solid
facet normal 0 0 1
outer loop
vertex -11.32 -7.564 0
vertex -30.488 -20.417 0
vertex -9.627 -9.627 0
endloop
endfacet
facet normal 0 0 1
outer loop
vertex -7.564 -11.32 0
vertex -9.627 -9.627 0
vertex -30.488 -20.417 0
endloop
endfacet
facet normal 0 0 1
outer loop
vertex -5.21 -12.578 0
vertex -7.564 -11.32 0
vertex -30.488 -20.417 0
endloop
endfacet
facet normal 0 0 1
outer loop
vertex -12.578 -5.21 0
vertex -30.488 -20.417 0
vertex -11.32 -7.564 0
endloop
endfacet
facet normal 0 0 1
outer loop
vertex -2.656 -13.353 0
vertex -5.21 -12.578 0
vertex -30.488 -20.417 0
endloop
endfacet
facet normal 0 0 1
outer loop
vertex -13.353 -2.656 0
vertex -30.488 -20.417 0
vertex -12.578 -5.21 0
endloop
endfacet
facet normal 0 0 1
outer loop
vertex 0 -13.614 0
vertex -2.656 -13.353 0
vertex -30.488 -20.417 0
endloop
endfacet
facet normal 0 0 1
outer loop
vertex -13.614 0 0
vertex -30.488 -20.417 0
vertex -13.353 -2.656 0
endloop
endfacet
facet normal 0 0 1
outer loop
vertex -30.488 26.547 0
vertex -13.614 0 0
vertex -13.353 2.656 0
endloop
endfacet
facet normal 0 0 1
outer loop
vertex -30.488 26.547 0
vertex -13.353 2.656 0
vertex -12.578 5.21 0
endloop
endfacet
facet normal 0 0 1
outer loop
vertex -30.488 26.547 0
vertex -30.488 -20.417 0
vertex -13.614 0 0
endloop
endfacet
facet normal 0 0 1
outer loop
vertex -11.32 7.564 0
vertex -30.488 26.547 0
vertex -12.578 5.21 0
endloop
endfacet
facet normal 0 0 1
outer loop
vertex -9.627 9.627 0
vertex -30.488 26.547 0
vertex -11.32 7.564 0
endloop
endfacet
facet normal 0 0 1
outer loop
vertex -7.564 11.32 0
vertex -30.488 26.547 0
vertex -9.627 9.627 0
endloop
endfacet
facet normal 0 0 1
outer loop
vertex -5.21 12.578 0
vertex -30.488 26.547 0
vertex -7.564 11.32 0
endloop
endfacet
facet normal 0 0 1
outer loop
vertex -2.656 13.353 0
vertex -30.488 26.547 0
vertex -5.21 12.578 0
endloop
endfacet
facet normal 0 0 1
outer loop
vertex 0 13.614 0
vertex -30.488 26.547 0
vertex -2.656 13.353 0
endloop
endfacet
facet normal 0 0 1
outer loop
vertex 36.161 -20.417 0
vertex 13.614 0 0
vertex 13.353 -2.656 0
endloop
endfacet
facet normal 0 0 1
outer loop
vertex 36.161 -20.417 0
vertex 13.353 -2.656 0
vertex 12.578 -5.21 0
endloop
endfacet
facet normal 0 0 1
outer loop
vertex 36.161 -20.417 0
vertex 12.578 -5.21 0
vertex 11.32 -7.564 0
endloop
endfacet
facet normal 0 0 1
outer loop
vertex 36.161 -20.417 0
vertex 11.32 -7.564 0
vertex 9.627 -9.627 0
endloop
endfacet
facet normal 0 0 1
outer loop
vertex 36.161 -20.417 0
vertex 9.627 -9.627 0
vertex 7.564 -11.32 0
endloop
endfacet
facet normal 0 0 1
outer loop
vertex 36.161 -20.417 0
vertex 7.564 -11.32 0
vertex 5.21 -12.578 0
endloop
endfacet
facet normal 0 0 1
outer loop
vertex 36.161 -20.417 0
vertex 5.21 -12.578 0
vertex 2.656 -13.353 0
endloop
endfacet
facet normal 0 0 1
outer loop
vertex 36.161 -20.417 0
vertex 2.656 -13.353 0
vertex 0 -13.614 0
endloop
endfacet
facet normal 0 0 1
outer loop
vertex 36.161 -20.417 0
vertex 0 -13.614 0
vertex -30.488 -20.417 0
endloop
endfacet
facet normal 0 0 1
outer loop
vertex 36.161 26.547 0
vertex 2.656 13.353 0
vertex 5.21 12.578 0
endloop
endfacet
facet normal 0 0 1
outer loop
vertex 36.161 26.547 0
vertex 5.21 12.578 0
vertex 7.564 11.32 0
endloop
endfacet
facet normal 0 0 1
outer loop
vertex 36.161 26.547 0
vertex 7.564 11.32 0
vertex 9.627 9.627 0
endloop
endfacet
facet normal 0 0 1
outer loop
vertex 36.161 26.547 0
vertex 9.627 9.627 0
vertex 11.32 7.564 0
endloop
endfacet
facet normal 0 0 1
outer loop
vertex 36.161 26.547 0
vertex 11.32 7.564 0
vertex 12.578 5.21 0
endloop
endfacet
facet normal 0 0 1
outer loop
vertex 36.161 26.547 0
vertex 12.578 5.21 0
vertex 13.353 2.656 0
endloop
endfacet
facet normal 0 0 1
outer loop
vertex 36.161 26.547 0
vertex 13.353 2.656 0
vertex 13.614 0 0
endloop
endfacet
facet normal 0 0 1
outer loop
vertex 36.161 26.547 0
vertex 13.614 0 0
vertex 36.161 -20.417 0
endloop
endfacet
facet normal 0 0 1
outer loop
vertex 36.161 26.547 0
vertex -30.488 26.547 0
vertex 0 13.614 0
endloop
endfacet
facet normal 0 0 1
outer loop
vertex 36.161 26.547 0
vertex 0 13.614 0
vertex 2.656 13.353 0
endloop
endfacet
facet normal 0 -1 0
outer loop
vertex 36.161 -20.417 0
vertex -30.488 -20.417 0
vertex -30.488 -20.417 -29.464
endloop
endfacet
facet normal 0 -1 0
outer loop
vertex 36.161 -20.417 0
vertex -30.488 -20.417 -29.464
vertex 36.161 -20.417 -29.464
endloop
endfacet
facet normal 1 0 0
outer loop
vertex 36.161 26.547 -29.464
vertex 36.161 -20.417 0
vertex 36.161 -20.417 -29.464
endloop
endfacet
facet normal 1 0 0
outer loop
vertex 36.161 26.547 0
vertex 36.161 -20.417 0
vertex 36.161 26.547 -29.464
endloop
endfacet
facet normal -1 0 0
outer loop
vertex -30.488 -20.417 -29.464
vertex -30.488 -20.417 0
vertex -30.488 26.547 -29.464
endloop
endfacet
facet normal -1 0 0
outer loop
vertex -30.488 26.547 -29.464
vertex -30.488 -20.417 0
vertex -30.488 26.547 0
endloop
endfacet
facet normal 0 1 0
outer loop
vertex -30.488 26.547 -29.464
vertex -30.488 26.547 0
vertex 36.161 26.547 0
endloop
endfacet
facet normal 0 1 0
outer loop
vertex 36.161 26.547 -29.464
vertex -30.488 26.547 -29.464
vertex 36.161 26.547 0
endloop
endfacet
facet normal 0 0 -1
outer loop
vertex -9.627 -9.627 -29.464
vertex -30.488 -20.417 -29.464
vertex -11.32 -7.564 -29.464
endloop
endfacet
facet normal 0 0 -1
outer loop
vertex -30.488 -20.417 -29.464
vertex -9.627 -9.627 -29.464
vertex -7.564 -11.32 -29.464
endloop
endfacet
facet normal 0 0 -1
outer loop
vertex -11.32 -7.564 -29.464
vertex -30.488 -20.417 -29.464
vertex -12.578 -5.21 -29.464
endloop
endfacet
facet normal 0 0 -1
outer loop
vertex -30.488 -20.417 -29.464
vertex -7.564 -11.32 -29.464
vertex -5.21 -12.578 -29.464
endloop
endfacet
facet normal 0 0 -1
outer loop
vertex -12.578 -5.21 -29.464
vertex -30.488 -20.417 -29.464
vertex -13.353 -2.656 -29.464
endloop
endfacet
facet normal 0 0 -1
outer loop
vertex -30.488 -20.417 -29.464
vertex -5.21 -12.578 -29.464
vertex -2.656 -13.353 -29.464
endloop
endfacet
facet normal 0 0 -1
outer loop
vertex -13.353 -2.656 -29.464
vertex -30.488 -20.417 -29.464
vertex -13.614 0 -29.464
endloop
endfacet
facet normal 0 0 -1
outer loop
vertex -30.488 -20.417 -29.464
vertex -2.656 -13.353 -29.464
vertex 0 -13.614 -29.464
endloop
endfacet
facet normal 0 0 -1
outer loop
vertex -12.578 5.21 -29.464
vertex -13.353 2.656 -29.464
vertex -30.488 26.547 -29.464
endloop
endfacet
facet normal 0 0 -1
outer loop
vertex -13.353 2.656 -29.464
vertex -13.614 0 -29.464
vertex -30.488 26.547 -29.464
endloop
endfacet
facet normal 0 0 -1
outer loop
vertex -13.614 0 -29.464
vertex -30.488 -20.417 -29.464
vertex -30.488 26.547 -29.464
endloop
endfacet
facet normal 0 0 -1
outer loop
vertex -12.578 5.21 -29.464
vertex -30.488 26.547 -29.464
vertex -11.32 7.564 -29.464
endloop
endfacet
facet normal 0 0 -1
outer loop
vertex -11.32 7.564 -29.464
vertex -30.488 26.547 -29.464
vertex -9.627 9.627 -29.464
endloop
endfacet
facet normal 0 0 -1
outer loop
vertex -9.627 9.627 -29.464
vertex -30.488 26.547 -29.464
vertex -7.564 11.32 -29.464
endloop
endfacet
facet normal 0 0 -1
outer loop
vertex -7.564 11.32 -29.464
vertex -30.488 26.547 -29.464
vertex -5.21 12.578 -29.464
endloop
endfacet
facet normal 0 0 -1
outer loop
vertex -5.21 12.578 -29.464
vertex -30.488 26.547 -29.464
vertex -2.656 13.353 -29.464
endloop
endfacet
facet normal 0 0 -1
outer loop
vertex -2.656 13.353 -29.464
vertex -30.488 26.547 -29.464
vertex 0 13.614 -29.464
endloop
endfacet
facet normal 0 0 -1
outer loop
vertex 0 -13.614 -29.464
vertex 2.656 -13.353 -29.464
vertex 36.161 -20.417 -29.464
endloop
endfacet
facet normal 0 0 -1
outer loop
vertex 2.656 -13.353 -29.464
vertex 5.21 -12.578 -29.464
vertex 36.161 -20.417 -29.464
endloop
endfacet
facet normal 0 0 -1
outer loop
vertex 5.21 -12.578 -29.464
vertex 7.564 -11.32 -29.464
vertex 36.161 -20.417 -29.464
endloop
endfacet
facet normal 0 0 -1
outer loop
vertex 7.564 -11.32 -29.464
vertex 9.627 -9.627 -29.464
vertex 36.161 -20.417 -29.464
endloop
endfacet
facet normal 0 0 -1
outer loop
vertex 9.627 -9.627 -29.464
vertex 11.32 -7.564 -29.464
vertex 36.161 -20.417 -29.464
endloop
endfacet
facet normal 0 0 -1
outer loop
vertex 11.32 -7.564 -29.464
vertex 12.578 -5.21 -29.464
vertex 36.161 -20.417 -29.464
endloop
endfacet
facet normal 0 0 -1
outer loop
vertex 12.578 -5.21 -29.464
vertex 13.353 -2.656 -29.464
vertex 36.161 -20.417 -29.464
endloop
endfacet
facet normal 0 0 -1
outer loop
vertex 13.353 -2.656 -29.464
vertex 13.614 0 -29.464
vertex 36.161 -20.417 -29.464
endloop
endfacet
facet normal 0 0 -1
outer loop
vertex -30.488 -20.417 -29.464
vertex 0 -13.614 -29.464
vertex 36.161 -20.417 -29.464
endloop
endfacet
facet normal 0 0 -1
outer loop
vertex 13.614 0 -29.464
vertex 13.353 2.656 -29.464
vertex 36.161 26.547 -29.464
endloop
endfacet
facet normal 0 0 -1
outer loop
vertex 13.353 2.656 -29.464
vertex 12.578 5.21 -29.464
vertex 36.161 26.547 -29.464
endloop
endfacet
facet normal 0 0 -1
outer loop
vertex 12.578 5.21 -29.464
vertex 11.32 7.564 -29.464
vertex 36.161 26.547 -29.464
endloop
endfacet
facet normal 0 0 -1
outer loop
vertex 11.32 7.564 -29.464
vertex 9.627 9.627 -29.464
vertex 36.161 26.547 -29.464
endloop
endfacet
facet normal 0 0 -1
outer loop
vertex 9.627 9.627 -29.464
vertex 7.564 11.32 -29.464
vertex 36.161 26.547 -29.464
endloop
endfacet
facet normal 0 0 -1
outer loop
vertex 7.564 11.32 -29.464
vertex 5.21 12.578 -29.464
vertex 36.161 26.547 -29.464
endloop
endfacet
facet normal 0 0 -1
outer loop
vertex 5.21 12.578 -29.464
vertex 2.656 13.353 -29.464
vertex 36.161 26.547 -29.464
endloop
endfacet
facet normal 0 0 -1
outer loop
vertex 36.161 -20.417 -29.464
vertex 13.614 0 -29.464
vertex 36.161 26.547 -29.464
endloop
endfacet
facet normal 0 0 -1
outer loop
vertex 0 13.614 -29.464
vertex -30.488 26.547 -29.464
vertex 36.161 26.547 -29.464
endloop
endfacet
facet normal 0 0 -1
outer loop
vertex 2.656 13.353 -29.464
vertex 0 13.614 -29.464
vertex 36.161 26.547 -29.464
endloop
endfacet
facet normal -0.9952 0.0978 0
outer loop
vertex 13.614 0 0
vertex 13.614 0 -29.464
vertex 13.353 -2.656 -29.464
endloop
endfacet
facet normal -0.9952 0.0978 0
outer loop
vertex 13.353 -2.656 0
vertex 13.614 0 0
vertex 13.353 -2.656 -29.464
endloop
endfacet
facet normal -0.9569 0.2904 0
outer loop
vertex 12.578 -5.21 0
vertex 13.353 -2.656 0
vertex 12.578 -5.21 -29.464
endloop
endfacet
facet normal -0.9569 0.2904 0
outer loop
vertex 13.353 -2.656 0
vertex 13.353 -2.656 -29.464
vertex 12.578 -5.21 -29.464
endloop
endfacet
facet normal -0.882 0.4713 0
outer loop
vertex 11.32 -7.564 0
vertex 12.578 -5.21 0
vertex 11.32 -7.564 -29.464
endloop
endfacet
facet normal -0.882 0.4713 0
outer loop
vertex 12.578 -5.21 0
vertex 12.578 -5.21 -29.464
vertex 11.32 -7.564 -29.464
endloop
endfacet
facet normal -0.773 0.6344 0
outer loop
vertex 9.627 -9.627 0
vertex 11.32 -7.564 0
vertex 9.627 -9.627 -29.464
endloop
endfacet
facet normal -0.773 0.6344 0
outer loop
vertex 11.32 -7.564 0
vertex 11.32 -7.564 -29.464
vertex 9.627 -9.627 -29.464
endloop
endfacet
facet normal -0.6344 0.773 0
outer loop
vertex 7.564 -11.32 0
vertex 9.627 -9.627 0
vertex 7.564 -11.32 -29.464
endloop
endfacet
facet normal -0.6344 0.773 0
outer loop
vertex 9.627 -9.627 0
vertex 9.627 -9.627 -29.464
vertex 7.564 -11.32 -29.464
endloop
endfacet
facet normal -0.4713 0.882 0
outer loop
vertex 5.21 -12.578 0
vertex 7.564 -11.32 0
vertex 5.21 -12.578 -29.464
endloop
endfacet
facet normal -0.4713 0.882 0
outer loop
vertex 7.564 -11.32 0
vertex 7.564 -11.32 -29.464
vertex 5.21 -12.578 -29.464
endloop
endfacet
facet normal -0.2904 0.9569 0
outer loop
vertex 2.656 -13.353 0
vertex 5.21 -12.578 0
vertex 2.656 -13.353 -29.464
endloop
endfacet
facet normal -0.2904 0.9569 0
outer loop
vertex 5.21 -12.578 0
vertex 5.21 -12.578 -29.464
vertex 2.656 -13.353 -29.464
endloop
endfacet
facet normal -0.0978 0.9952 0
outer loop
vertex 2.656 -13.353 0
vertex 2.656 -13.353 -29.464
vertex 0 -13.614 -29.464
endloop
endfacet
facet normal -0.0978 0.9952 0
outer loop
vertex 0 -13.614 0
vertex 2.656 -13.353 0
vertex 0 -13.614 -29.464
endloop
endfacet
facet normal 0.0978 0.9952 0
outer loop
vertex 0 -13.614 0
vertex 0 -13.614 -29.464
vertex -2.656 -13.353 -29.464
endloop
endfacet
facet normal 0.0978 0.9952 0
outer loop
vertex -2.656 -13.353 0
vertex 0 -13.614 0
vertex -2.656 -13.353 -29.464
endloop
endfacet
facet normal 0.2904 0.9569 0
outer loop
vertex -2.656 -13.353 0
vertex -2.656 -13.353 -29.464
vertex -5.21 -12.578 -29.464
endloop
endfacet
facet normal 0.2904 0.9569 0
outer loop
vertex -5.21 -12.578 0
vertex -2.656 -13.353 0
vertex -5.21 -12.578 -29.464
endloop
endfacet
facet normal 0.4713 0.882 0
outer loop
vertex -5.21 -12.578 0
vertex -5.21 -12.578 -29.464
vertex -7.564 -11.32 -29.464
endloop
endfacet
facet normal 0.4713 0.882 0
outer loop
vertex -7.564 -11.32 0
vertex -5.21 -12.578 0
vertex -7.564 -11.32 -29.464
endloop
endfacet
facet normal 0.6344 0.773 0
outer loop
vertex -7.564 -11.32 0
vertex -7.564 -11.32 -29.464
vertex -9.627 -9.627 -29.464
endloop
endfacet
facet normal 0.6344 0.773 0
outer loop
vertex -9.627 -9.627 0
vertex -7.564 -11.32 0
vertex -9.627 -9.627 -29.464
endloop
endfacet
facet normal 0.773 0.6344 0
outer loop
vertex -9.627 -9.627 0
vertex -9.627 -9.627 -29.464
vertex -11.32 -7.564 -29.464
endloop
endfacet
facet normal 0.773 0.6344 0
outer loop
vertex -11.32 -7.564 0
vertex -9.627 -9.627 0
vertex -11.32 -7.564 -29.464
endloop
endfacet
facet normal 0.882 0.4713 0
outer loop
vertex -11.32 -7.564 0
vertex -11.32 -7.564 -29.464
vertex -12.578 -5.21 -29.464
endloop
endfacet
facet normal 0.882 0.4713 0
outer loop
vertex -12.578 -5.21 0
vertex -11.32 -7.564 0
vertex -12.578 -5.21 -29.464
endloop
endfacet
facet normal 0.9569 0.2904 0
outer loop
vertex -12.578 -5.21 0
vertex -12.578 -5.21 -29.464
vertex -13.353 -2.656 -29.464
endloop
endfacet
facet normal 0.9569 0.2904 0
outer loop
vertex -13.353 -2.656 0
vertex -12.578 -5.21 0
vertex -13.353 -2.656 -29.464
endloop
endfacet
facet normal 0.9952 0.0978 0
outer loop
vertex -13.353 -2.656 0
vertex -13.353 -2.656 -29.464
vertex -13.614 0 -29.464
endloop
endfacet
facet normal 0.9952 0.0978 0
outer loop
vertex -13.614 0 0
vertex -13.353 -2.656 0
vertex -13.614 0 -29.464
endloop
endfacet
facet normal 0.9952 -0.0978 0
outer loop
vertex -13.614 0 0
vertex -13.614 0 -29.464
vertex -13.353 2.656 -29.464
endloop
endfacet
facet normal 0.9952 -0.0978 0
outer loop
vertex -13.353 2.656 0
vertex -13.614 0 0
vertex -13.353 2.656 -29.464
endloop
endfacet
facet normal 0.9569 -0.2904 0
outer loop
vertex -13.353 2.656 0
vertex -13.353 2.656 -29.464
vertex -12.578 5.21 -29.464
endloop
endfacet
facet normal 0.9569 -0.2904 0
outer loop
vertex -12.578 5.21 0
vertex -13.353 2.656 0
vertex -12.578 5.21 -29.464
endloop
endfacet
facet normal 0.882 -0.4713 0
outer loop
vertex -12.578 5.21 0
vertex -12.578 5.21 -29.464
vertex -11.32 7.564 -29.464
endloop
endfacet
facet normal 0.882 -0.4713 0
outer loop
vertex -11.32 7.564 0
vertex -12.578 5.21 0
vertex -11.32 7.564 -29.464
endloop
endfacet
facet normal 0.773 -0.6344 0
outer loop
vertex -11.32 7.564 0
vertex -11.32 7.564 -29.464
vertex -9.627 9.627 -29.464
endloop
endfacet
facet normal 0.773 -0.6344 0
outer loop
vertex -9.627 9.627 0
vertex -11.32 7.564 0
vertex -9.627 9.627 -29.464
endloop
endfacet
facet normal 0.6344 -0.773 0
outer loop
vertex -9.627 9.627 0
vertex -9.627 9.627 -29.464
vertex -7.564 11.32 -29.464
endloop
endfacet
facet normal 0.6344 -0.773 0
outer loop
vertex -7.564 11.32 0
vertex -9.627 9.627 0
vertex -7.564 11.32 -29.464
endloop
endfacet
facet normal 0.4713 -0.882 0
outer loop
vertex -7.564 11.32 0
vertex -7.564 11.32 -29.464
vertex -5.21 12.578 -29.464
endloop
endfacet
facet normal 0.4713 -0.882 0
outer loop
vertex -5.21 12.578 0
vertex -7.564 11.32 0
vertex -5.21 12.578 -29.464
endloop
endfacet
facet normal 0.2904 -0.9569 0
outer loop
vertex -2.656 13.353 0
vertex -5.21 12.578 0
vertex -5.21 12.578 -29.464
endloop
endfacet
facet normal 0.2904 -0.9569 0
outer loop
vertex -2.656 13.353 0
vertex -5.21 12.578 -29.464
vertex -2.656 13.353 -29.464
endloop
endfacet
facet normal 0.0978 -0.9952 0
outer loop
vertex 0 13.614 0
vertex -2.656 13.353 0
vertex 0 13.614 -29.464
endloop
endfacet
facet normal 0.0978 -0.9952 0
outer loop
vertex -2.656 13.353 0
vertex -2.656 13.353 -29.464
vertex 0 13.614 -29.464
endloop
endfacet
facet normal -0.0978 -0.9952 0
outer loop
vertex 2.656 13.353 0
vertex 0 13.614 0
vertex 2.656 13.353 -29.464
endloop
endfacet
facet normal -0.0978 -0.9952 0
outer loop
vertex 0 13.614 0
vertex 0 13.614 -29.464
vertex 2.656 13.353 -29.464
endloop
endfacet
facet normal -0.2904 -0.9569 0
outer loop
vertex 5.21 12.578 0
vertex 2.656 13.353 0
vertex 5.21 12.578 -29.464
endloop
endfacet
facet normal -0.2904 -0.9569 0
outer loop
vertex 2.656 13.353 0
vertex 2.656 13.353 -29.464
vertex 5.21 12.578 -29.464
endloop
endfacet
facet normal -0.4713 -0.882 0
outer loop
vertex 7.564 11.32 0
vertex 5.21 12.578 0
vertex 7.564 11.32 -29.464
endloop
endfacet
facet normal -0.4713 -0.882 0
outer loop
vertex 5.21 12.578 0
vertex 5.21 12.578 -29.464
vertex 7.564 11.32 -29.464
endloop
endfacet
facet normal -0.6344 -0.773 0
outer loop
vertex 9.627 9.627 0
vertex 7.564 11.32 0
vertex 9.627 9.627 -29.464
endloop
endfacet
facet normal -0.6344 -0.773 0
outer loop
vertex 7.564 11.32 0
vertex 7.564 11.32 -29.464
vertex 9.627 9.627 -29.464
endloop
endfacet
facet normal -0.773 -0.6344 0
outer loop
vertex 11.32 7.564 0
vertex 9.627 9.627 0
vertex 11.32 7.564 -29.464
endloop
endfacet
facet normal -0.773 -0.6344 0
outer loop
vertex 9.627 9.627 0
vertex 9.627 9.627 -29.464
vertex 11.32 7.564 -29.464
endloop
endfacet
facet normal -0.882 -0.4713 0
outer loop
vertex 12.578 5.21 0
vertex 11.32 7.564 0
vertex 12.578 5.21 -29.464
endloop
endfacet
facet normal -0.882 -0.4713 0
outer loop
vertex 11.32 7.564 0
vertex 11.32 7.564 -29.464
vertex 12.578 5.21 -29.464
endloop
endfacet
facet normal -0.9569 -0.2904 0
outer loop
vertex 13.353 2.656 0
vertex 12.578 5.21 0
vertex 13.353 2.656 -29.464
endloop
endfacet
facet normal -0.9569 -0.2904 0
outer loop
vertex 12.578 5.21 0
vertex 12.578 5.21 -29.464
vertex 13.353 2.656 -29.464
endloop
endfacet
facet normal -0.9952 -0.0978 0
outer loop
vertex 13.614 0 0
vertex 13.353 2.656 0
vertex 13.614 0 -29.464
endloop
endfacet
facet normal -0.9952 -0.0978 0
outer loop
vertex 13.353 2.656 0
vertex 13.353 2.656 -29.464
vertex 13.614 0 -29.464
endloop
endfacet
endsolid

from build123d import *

# Parameters (mm, degrees)
F0_W      = 66.6496
F0_H      = 46.9646
F2_DEPTH  = 29.464
F1_R      = 13.6144
F3_DEPTH  = 48.514
F3_FACE_R = 13.6144
F4_DEPTH  = 84.836


with BuildPart() as f2:
    # F0 (on Top) → F2 (new body)
    with BuildSketch(Plane.XY):
        with Locations((2.836652, 3.065012)):
            Rectangle(F0_W, F0_H)
    extrude(amount=-F2_DEPTH)

    # F1 (on Top) → F3 (join)
    with BuildSketch(Plane.XY):
        Circle(F1_R)
    extrude(amount=-F3_DEPTH)

    # F3_face (on face) → F4 (cut)
    with BuildSketch(Plane(origin=(0, 0, -48.514), x_dir=(1, 0, 0), z_dir=(0, 0, -1))):
        Circle(F3_FACE_R)
    extrude(amount=-F4_DEPTH, mode=Mode.SUBTRACT)


solid = f2.part
